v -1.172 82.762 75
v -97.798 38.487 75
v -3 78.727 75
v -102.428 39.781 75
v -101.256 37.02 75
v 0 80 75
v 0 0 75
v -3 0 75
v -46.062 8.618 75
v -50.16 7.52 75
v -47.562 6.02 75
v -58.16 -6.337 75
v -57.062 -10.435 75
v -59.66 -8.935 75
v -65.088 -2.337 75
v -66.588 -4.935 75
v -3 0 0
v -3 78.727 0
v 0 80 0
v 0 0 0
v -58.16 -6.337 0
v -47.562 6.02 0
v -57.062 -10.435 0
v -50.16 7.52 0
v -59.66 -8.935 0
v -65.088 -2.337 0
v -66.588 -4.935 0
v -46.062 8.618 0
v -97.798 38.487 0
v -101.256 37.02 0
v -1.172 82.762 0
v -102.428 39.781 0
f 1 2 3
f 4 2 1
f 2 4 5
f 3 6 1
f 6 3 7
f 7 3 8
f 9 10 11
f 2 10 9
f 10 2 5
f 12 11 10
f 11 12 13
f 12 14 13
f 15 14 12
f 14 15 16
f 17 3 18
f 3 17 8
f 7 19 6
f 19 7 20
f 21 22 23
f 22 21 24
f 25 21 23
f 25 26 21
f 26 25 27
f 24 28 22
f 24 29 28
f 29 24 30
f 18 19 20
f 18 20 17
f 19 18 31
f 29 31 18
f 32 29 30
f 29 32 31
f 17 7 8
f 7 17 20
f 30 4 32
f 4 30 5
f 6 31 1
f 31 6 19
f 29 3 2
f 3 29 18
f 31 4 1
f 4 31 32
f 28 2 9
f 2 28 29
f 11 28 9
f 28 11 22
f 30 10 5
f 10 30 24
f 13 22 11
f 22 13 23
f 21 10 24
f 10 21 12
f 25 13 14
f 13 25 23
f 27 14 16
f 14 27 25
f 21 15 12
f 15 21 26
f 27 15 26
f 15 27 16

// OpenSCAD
/* [Basic] */
// Lay flat on bed ?
lay_flat = "yes";	//	[yes,no]

// How large is the support
width = 75; // [10:200]
// How long is the base
base_length = 80; // [10:200]
// How long is the back
back_length = 110; // [10:200]
// How long is the front
front_length = 62; // [10:100]
// How much space for the phone (leave some space)
phone_space = 16; // [5:100]

// Incline of the back
back_angle = 23;  // [0:90]

/* [Advanced] */
// How tick is the base
base_tickness = 3; // [1:10]
// How tick is the back
back_thickness = 3; // [1:10]
// How tick is the front
front_thickness = 3; // [1:10]
// How long is the retainer
retainer_length  = 8; // [1:50]
// Incline of the front
front_angle = 37;  // [0:90]

module stand() {
	//	base
	cube([width,base_length,base_tickness]);
	
	//back
	translate([0,base_length,0])
	rotate(back_angle,[1,0,0])
	cube([width,back_thickness,back_length]);
	
	//front
	real_front_angle = front_angle + back_angle;
	front_transY = base_length - sin(back_angle) * back_length;
	front_transZ = cos(back_angle) * back_length;
	translate([0,front_transY, front_transZ])
	rotate(real_front_angle + 180, [1,0,0])
	cube([width,front_length,front_thickness]);
	
	//houder
	h_transY = front_transY - cos(real_front_angle) * (front_length - front_thickness);
	h_transX = cos(back_angle) * back_length - sin(real_front_angle) * (front_length - front_thickness);
	translate([0,h_transY,h_transX]) //-7, 46?
	rotate(real_front_angle + 90,[1,0,0])
	cube([width,phone_space + front_thickness, front_thickness]);
	
	
	//stuff
	s_transY = h_transY - sin(real_front_angle) * (phone_space);
	s_transX = h_transX + cos(real_front_angle) * (phone_space);
	translate([0,s_transY,s_transX]) //-7, 46?
	rotate(real_front_angle,[1,0,0])
	cube([width, retainer_length, front_thickness]);
}
//Render
if(lay_flat == "yes") {
	rotate(270,[0,1,0]) stand();
}else {
	stand();
}
